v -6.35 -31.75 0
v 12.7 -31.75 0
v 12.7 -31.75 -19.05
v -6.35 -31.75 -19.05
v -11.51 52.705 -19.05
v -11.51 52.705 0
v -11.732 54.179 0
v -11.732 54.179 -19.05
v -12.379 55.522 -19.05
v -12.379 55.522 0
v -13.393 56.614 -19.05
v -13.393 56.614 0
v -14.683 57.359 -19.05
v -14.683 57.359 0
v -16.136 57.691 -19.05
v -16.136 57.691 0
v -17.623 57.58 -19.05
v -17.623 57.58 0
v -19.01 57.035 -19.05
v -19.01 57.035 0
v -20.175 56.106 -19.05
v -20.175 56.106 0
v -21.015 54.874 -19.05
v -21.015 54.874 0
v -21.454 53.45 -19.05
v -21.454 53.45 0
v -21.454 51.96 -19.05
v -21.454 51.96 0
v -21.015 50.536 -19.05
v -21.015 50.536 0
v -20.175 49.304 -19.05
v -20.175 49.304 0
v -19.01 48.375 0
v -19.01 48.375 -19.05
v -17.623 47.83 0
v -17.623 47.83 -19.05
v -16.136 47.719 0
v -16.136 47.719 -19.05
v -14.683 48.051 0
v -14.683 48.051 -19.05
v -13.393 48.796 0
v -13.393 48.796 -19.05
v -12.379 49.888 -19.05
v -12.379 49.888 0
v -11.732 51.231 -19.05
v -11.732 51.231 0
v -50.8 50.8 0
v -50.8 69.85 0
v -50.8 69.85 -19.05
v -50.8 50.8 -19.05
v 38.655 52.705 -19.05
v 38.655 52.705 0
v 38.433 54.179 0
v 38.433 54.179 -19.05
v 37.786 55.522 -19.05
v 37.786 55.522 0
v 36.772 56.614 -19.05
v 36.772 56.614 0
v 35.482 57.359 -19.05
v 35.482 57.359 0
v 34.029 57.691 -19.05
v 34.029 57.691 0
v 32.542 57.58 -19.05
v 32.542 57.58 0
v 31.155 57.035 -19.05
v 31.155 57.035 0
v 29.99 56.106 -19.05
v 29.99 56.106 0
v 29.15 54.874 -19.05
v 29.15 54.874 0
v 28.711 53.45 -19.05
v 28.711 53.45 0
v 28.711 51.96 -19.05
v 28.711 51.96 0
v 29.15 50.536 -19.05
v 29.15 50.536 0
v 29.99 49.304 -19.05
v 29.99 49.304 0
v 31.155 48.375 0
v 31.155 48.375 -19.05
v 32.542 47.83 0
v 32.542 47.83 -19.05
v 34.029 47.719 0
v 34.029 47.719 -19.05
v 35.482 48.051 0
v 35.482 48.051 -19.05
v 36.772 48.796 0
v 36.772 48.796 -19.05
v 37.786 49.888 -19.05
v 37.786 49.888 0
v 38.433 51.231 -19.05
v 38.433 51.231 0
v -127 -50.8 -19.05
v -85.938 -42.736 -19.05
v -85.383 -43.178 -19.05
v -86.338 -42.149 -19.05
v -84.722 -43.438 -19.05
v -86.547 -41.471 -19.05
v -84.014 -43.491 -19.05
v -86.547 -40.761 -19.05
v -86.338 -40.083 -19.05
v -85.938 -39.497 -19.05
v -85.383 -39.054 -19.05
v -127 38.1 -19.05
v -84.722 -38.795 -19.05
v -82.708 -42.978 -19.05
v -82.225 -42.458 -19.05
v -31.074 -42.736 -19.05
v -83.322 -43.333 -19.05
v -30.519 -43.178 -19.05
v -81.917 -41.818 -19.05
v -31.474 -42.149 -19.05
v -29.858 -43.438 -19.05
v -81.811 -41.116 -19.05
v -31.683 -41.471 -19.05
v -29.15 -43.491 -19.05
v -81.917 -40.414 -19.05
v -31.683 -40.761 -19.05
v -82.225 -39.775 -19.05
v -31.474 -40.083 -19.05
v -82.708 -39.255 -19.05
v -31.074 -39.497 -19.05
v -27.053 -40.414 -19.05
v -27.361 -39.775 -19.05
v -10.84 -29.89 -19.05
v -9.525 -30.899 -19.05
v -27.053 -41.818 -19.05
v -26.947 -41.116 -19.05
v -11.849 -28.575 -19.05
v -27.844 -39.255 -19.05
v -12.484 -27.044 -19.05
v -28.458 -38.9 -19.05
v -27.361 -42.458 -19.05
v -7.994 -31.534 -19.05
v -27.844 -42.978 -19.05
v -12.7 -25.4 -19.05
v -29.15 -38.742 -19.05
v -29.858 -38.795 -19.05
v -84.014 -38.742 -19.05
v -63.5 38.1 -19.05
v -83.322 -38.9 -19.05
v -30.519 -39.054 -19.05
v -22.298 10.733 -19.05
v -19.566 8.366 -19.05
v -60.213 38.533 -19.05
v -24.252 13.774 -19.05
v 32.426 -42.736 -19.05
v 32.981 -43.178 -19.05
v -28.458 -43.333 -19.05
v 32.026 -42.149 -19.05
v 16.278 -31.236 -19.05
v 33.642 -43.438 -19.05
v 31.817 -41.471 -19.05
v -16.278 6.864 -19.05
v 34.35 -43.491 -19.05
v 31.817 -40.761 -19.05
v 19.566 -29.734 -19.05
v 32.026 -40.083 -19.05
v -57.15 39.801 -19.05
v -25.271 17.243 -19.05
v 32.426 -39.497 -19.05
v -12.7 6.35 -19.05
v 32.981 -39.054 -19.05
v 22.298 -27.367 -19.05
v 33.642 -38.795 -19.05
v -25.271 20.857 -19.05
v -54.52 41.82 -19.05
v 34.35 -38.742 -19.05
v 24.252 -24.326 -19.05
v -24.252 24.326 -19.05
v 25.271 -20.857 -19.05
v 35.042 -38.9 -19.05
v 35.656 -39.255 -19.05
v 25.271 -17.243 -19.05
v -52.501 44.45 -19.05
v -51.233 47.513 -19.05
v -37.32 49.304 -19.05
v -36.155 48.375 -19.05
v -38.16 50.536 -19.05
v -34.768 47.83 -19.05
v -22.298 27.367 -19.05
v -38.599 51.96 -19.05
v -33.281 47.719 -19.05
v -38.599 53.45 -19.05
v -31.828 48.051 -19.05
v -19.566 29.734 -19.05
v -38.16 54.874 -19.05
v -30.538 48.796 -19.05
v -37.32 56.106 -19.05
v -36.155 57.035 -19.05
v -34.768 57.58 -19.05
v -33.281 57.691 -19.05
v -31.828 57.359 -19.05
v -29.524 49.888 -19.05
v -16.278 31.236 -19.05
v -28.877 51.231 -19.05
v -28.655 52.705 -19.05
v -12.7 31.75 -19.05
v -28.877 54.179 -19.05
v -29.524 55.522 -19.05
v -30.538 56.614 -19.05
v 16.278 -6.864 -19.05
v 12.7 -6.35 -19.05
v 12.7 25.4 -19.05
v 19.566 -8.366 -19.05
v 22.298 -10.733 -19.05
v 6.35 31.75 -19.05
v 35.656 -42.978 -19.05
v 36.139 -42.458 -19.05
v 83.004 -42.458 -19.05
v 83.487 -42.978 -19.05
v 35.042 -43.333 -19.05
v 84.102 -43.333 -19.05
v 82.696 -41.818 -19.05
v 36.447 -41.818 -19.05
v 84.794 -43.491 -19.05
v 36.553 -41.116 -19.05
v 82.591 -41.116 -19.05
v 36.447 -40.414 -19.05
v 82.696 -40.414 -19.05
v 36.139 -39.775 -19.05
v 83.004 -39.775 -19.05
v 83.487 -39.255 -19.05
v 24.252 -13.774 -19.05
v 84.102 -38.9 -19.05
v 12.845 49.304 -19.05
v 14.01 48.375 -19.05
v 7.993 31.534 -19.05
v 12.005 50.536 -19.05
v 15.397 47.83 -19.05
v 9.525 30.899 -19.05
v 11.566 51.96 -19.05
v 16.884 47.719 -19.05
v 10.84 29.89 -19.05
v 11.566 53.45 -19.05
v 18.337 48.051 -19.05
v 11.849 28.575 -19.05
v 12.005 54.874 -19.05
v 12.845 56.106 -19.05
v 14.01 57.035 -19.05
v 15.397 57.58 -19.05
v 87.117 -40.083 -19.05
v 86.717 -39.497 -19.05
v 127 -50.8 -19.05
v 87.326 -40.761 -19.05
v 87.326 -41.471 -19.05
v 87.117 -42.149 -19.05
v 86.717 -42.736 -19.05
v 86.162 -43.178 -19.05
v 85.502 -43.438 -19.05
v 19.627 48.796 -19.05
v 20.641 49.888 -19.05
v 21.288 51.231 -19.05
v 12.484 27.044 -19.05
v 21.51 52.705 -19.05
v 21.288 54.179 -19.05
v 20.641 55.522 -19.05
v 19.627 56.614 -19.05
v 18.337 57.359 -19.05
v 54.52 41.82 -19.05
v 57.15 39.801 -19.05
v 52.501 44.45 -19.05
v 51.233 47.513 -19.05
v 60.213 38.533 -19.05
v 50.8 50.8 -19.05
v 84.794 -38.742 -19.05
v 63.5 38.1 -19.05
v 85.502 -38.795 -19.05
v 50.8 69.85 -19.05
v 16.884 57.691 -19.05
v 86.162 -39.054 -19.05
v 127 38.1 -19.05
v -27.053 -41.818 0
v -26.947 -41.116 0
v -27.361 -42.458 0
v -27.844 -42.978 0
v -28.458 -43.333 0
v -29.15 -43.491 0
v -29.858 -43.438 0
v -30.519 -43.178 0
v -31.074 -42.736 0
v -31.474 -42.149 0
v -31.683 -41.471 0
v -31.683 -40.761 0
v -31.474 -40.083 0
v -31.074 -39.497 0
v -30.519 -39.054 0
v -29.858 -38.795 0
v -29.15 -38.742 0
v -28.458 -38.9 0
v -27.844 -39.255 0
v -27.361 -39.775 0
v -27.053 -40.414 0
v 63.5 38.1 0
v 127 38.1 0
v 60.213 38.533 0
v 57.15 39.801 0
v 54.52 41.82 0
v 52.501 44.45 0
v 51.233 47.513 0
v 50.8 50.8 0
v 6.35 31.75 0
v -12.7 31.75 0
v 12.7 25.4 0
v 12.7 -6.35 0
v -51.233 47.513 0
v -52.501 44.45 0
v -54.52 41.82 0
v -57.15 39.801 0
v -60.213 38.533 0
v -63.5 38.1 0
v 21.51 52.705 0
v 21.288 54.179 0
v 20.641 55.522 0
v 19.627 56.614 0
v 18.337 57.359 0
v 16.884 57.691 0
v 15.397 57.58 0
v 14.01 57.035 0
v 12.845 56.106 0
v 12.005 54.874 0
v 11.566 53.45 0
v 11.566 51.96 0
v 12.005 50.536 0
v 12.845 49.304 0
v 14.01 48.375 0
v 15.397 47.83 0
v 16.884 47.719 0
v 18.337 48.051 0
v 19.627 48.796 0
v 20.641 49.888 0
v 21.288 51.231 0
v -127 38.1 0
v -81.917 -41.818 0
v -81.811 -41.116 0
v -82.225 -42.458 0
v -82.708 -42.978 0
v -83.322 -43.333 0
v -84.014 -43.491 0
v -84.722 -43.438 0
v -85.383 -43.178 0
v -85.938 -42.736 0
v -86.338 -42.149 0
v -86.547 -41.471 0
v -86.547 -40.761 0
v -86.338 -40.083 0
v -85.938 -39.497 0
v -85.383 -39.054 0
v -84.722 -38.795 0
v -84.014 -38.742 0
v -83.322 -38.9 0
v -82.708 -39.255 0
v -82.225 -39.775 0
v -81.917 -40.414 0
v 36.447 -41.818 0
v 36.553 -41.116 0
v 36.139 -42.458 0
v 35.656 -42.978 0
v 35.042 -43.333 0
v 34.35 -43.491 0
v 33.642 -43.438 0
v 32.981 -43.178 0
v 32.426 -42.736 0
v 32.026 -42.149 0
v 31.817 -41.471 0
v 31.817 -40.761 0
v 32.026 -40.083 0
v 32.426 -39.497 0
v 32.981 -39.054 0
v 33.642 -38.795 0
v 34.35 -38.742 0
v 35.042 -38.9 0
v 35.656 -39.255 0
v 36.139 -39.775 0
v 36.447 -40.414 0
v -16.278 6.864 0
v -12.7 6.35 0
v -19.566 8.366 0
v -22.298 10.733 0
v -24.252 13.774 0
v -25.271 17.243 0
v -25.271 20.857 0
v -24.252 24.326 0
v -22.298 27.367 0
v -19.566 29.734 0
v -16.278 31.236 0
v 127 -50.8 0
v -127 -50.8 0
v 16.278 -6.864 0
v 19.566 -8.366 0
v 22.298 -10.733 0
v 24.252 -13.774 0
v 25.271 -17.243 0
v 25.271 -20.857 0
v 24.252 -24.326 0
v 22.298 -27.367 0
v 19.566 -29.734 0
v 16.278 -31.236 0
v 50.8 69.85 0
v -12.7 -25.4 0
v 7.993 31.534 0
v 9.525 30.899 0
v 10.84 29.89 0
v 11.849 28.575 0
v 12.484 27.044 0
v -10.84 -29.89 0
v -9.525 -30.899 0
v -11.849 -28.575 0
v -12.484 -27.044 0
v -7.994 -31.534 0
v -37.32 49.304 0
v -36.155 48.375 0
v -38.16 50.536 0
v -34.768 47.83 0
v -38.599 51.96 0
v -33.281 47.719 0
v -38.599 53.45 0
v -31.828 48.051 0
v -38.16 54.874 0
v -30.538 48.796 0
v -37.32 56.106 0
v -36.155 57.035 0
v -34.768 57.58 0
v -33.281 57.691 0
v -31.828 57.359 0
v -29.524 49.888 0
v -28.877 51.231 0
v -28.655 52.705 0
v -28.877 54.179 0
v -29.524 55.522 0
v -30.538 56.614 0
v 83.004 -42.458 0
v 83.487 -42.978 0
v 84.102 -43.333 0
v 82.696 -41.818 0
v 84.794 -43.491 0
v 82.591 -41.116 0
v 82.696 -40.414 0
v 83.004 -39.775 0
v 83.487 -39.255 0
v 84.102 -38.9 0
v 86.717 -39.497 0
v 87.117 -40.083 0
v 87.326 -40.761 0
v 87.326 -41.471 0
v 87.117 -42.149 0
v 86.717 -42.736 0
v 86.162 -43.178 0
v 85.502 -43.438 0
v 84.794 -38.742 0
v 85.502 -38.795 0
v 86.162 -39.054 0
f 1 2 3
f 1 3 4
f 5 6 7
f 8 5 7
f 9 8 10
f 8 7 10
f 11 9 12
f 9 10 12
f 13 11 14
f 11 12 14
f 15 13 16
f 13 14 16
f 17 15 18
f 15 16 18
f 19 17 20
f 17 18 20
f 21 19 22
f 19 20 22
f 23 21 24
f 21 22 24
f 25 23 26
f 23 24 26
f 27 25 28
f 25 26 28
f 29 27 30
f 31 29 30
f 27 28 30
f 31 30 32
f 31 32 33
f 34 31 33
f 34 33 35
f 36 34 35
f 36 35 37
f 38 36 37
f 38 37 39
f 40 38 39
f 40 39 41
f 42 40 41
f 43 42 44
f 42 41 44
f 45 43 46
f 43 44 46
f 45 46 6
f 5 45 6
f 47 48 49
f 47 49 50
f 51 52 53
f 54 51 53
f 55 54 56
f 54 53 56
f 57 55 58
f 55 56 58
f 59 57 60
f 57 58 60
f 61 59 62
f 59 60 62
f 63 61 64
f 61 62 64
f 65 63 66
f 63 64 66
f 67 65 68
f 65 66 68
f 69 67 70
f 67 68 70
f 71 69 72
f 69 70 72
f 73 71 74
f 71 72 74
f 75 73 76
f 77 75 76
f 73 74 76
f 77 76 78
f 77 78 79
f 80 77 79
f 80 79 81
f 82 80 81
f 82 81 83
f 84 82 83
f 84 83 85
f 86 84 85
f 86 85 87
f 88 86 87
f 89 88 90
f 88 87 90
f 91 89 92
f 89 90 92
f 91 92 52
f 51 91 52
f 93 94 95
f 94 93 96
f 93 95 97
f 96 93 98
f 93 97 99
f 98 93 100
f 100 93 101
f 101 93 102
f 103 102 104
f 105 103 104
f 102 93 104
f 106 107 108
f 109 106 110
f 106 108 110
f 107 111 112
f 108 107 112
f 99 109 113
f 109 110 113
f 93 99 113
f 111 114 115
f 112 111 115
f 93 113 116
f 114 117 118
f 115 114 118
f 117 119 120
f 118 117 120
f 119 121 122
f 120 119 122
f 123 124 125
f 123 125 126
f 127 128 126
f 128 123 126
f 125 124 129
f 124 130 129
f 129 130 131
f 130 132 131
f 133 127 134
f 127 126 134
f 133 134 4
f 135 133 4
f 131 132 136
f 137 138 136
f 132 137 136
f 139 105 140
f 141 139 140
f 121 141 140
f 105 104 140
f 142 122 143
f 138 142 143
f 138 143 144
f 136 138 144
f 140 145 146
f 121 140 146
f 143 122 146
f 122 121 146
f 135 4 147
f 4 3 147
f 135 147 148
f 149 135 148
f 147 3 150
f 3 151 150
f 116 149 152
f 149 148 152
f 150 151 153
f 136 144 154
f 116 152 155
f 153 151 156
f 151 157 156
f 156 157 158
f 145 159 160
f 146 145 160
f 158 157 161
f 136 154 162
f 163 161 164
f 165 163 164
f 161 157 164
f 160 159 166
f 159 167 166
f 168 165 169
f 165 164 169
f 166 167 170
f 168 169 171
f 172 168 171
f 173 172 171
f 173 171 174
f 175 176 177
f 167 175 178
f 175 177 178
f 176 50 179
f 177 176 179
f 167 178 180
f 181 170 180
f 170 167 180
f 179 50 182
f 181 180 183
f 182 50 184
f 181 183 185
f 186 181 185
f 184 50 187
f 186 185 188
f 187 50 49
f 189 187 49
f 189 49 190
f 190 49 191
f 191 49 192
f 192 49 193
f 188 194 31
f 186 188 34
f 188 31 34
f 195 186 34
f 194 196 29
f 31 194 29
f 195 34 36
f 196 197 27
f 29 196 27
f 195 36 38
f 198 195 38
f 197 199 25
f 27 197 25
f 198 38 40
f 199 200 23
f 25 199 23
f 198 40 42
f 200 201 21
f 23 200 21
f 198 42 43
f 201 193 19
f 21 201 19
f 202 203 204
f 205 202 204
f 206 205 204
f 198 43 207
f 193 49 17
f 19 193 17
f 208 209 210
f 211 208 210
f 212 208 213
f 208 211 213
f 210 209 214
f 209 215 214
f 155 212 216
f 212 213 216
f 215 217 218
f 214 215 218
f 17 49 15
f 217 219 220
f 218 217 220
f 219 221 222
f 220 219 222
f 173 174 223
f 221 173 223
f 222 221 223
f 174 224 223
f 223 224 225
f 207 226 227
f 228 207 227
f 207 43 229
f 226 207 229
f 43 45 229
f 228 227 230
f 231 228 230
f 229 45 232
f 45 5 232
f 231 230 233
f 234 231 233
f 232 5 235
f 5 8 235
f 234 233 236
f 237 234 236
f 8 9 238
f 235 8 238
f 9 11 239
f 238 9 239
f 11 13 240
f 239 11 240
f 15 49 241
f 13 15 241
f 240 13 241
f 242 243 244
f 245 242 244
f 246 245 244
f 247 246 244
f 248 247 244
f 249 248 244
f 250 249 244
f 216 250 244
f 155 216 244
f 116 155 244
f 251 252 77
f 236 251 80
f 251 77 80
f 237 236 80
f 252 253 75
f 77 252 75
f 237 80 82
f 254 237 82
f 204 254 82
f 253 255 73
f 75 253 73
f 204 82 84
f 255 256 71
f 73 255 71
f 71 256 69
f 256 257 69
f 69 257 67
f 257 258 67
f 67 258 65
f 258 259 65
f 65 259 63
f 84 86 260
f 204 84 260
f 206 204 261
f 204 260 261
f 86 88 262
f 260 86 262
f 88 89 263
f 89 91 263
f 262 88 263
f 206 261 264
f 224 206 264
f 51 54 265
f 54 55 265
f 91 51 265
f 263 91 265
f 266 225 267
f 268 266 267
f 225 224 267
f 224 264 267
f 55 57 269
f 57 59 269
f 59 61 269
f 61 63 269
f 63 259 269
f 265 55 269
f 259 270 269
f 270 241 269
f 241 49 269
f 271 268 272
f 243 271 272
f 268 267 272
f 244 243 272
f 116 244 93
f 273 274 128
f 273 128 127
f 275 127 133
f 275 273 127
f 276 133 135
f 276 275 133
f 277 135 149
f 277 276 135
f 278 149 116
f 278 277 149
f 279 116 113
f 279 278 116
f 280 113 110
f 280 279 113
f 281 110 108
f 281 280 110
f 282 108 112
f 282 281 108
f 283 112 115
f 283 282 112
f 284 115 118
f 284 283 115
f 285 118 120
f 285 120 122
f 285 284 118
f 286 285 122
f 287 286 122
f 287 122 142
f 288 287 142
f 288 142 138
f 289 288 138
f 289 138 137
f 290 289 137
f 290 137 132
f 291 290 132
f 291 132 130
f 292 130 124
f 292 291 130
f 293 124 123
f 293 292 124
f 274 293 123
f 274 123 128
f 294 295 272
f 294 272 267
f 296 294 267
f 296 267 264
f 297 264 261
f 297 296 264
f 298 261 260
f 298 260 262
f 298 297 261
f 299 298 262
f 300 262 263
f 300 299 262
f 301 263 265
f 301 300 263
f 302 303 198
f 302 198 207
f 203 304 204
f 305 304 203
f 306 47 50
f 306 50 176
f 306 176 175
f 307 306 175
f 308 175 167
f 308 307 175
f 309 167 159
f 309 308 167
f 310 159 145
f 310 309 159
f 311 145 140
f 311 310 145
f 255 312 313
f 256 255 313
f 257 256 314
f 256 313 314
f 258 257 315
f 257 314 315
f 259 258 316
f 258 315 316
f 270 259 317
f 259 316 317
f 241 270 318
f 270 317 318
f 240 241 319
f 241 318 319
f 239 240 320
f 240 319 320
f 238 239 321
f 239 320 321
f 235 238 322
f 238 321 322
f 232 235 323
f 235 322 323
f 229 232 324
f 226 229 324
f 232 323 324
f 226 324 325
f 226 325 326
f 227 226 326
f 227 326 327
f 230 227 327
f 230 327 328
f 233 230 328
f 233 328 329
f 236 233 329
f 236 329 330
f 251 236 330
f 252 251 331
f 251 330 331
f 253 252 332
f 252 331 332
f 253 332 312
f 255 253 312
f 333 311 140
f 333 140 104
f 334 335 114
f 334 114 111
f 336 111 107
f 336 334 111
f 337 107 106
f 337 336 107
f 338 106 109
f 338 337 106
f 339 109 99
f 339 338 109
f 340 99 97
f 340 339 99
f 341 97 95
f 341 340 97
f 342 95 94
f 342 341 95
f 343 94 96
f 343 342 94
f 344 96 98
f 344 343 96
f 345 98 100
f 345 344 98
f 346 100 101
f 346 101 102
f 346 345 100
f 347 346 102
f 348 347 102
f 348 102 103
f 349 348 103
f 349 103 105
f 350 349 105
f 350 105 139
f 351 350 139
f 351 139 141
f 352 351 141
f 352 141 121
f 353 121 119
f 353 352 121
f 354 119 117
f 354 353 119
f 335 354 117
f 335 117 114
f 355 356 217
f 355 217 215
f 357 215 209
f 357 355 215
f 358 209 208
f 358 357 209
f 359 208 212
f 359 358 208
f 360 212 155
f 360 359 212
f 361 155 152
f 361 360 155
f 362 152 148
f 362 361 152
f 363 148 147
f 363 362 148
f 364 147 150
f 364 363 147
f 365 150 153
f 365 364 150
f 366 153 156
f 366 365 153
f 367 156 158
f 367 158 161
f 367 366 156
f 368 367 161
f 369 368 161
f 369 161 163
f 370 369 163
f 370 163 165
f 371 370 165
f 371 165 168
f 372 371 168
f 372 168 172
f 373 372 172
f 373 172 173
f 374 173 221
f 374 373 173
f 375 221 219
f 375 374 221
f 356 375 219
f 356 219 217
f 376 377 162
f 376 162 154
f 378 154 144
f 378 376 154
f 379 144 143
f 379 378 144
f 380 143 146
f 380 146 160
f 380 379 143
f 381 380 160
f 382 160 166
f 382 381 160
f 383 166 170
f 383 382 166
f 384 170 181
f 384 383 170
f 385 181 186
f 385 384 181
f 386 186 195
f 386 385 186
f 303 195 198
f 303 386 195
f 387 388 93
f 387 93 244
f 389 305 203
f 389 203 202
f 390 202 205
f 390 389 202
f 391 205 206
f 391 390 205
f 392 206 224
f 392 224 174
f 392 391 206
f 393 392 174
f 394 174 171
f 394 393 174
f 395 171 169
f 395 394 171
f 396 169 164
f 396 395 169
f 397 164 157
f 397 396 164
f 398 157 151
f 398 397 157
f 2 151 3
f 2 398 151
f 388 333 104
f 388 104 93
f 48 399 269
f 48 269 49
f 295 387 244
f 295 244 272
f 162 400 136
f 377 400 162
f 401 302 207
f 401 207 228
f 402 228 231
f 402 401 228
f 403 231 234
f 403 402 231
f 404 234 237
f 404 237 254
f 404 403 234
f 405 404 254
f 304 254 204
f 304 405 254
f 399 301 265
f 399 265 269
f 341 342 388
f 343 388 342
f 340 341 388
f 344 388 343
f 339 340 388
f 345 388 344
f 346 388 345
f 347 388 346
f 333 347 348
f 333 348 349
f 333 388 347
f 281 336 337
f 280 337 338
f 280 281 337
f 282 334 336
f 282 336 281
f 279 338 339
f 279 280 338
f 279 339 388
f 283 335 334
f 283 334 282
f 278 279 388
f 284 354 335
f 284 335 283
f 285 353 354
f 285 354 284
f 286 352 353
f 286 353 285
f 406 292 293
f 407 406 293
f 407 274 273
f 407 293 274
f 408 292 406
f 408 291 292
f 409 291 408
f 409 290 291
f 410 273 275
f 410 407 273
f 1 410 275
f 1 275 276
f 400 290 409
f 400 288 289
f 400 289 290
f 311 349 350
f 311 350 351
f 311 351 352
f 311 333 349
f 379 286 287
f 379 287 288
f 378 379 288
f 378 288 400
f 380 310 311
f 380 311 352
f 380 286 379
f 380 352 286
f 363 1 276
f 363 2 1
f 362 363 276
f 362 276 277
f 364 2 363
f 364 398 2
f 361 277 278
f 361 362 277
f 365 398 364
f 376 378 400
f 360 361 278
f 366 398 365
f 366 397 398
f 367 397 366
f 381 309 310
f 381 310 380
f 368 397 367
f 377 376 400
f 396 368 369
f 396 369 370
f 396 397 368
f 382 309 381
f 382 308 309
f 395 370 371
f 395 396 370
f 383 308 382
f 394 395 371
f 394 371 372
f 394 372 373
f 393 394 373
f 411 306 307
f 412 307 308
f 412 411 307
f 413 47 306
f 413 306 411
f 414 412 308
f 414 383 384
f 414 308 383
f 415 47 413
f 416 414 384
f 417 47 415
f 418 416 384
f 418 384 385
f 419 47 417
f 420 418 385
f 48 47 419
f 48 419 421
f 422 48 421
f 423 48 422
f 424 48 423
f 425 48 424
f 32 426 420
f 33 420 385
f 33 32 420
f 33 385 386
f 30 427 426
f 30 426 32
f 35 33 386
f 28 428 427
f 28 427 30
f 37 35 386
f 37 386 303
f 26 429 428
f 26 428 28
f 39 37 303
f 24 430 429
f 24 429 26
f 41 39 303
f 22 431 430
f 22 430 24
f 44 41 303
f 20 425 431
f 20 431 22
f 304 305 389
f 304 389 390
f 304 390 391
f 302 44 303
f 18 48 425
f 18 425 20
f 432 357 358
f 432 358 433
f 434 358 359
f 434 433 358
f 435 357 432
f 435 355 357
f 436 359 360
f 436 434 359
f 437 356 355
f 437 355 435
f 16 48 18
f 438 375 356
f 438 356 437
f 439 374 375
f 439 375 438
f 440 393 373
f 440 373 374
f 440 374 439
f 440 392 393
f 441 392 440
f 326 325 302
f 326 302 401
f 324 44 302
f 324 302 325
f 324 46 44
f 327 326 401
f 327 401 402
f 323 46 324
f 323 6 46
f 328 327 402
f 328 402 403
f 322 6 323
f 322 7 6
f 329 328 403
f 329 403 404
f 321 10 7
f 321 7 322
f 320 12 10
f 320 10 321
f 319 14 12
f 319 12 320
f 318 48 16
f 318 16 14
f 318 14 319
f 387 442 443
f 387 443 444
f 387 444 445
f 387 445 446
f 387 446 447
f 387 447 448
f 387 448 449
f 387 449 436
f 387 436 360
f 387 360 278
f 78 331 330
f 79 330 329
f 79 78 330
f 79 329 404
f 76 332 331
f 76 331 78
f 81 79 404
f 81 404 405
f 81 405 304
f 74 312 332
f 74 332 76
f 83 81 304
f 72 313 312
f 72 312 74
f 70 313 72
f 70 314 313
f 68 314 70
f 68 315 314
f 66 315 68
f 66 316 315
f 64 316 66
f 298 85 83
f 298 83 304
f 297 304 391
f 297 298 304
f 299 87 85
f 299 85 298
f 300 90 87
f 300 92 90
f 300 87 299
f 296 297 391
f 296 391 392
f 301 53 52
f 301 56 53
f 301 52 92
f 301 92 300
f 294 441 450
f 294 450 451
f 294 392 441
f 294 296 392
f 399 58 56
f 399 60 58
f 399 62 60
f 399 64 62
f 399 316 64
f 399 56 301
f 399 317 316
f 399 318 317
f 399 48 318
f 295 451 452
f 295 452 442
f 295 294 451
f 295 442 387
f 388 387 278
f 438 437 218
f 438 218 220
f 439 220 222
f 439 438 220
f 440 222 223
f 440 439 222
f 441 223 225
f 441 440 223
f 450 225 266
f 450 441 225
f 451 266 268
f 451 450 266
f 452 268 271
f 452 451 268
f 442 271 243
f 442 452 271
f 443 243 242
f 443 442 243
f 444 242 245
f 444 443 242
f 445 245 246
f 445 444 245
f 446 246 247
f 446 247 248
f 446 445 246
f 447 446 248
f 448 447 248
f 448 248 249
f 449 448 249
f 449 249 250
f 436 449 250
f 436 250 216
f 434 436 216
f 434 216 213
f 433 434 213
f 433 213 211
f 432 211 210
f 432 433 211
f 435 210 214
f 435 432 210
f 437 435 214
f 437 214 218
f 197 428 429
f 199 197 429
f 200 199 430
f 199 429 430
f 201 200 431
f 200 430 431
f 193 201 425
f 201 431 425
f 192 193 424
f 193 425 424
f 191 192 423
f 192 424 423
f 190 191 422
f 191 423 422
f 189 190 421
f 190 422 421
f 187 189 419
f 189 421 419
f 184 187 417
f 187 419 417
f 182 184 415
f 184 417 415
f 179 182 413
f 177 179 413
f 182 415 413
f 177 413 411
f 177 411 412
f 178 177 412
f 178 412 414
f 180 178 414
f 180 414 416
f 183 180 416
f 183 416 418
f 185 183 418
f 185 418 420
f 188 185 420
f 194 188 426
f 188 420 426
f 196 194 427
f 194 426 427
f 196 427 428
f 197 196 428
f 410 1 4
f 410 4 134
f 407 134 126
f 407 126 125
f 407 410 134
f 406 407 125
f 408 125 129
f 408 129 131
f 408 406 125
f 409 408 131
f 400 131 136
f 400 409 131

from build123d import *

# Parameters (mm, degrees)
F0_R     = 5
F1_DEPTH = 19.05


with BuildPart() as f1:
    # F0 (on Top) → F1 (new body)
    with BuildSketch(Plane.XY):
        with BuildLine():
            Line((-50.8, -50.8), (50.8, -50.8))
            Line((50.8, -50.8), (127, -50.8))
            Line((127, -50.8), (127, -38.1))
            Line((127, -38.1), (127, 38.1))
            Line((127, 38.1), (63.5, 38.1))
            ThreePointArc((63.5, 38.1), (54.519744, 41.819744), (50.8, 50.8))
            Line((50.8, 50.8), (50.8, 69.85))
            Line((50.8, 69.85), (-50.8, 69.85))
            Line((-50.8, 69.85), (-50.8, 50.8))
            ThreePointArc((-50.8, 50.8), (-54.519744, 41.819744), (-63.5, 38.1))
            Line((-63.5, 38.1), (-127, 38.1))
            Line((-127, 38.1), (-127, -38.1))
            Line((-127, -38.1), (-127, -50.8))
            Line((-127, -50.8), (-50.8, -50.8))
        make_face()
        with BuildLine():
            ThreePointArc((-86.57349, -41.11626), (-84.19224, -38.73501), (-81.81099, -41.11626))
            ThreePointArc((-81.81099, -41.11626), (-84.19224, -43.49751), (-86.57349, -41.11626))
        make_face(mode=Mode.SUBTRACT)
        with BuildLine():
            ThreePointArc((-31.70949, -41.11626), (-29.32824, -38.73501), (-26.94699, -41.11626))
            ThreePointArc((-26.94699, -41.11626), (-29.32824, -43.49751), (-31.70949, -41.11626))
        make_face(mode=Mode.SUBTRACT)
        with BuildLine():
            ThreePointArc((12.699988, -6.35), (25.399988, -19.05), (12.699988, -31.75))
            Line((12.699988, -31.75), (-6.350012, -31.75))
            ThreePointArc((-6.350012, -31.75), (-10.840141, -29.890128), (-12.700012, -25.4))
            Line((-12.700012, -25.4), (-12.700012, 6.35))
            ThreePointArc((-12.700012, 6.35), (-25.400012, 19.05), (-12.700012, 31.75))
            Line((-12.700012, 31.75), (6.349988, 31.75))
            ThreePointArc((6.349988, 31.75), (10.840116, 29.890128), (12.699988, 25.4))
            Line((12.699988, 25.4), (12.699988, -6.35))
        make_face(mode=Mode.SUBTRACT)
        with BuildLine():
            ThreePointArc((31.79051, -41.11626), (34.17176, -38.73501), (36.55301, -41.11626))
            ThreePointArc((36.55301, -41.11626), (34.17176, -43.49751), (31.79051, -41.11626))
        make_face(mode=Mode.SUBTRACT)
        with BuildLine():
            ThreePointArc((87.35301, -41.11626), (84.97176, -43.49751), (82.59051, -41.11626))
            ThreePointArc((82.59051, -41.11626), (84.97176, -38.73501), (87.35301, -41.11626))
        make_face(mode=Mode.SUBTRACT)
        with Locations((-33.655, 52.705)):
            Circle(F0_R, mode=Mode.SUBTRACT)
        with Locations((-16.51, 52.705)):
            Circle(F0_R, mode=Mode.SUBTRACT)
        with Locations((16.51, 52.705)):
            Circle(F0_R, mode=Mode.SUBTRACT)
        with Locations((33.655, 52.705)):
            Circle(F0_R, mode=Mode.SUBTRACT)
    extrude(amount=-F1_DEPTH)


with BuildPart() as f2_1:
    # F2: copy of F1
    add(f1.part)


with BuildPart() as f4_1:
    # F4: copy of F1
    add(f1.part)


solid = f1.part
